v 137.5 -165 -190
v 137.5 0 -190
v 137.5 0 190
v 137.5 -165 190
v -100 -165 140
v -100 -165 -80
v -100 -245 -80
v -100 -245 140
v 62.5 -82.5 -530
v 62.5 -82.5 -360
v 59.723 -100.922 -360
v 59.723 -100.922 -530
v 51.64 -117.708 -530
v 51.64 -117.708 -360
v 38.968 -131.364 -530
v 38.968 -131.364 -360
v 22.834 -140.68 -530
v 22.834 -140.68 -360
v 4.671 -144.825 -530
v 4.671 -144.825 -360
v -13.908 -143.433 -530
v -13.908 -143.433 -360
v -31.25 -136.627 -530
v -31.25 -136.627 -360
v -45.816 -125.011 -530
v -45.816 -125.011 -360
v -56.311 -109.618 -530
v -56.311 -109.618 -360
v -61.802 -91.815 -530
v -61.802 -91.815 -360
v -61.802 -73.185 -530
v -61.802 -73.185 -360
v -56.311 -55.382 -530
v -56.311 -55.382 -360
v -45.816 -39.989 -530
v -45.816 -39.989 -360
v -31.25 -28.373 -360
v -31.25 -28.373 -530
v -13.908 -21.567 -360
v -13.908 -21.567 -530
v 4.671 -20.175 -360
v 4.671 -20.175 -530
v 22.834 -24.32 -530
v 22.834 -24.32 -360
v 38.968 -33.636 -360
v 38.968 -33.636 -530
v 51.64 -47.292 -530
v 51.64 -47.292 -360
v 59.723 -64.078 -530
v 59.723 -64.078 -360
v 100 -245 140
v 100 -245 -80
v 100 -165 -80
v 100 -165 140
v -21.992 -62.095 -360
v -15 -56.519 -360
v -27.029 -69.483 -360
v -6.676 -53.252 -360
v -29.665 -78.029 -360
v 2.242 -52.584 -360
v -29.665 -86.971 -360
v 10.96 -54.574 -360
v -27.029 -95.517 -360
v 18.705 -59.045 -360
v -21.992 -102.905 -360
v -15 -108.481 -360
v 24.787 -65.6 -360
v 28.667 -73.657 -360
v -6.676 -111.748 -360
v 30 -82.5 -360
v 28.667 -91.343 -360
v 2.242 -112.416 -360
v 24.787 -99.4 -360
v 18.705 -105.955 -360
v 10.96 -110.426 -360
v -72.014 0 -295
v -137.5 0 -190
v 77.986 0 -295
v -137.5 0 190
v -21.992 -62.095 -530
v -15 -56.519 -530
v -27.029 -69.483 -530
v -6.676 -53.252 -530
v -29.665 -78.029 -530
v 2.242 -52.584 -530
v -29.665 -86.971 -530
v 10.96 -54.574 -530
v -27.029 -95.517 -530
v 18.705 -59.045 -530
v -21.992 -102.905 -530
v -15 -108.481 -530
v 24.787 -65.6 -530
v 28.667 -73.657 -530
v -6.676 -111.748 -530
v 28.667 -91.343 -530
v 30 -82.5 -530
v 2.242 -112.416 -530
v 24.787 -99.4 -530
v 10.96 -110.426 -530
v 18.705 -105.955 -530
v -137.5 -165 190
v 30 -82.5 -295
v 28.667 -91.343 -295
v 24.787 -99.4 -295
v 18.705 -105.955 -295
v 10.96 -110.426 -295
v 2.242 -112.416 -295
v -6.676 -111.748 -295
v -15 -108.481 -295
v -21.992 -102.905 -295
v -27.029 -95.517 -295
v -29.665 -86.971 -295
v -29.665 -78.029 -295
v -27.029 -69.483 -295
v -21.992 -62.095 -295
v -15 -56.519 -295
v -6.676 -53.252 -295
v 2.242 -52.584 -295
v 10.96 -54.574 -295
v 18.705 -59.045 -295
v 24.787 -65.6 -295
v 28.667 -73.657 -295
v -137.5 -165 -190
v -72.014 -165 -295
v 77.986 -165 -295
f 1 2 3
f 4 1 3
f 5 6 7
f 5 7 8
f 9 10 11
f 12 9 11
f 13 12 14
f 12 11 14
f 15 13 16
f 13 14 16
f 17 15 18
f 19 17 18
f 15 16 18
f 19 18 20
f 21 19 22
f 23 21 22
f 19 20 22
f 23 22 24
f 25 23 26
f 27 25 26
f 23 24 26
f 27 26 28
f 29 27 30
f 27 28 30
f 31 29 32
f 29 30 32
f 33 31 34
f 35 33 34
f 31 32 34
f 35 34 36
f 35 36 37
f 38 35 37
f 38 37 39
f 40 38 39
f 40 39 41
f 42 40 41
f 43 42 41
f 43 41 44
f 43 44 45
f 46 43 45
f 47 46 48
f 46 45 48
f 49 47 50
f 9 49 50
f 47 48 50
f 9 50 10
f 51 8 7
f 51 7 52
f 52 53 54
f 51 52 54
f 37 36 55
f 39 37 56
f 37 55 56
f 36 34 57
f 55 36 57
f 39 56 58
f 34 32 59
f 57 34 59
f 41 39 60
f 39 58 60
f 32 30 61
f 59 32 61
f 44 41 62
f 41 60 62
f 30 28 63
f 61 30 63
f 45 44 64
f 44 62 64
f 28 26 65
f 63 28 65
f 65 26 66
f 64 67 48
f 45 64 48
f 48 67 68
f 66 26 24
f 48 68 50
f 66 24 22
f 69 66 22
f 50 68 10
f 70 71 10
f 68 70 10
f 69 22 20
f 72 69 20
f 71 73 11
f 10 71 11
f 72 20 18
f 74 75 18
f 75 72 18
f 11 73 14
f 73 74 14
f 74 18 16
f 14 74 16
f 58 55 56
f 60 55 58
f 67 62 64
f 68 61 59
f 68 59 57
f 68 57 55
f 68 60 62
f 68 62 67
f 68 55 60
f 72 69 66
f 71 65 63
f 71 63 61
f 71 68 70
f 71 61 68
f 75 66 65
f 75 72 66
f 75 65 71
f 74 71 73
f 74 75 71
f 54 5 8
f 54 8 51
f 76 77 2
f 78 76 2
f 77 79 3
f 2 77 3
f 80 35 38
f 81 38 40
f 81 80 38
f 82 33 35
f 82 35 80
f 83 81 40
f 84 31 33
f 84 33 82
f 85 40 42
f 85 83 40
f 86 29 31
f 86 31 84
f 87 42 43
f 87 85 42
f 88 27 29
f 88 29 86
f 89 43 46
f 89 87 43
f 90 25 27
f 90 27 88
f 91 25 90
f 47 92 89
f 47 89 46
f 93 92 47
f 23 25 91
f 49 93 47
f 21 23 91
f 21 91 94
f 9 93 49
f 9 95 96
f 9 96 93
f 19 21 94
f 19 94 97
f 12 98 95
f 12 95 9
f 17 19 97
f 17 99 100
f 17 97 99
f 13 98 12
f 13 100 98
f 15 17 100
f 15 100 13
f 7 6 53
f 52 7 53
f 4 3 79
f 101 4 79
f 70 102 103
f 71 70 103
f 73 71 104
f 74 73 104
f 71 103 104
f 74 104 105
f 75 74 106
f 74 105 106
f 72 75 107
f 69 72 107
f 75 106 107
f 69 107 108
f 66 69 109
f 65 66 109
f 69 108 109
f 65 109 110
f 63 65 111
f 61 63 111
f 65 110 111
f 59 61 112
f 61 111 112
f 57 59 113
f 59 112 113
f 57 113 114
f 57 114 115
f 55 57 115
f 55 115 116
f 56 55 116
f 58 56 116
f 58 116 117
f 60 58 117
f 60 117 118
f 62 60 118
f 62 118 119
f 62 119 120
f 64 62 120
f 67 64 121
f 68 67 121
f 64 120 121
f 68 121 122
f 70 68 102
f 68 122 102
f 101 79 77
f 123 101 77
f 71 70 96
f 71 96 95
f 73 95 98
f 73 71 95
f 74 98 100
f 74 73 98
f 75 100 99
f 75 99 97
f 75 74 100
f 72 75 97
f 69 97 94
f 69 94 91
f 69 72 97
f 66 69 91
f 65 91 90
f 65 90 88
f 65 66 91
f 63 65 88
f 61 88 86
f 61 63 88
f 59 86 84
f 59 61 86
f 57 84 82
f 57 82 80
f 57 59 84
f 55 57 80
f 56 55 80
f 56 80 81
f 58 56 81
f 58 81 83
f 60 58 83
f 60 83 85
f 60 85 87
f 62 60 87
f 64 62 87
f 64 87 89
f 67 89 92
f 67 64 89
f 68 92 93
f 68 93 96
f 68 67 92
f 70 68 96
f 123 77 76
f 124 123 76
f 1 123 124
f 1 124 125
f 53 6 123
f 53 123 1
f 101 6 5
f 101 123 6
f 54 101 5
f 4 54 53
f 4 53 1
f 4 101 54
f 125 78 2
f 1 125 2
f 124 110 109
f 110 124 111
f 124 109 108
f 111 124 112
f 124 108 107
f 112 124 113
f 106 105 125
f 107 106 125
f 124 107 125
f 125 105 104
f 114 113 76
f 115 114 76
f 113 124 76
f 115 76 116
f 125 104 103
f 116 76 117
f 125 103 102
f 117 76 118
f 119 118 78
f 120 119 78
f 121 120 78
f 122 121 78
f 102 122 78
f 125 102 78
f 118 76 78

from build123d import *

# Parameters (mm, degrees)
F1_DEPTH = 165
F7_R     = 30
F2_DEPTH = 65
F3_R     = 62.5
F3_R_2   = 30
F4_DEPTH = 170
F5_W     = 200
F5_H     = 220
F6_DEPTH = 80


with BuildPart() as f1:
    # F0 (on Front) → F1 (new body)
    with BuildSketch(Plane.XZ):
        Polygon((137.5, -190), (137.5, 190), (-137.5, 190), (-137.5, -190), (-72.013795, -295), (77.986205, -295), align=None)
    extrude(amount=F1_DEPTH)

    # F7 (on face) → F2 (join)
    with BuildSketch(Plane(origin=(0, 0, -295), x_dir=(1, 0, 0), z_dir=(0, 0, -1))):
        with Locations((0, 82.5)):
            Circle(F7_R)
    extrude(amount=F2_DEPTH)

    # F3 (on face) → F4 (join)
    with BuildSketch(Plane(origin=(0, 0, -360), x_dir=(1, 0, 0), z_dir=(0, 0, -1))):
        with Locations((0, 82.5)):
            Circle(F3_R)
        with Locations((0, 82.5)):
            Circle(F3_R_2, mode=Mode.SUBTRACT)
    extrude(amount=F4_DEPTH)

    # F5 (on face) → F6 (join)
    with BuildSketch(Plane.XZ.offset(165)):
        with Locations((0, 30)):
            Rectangle(F5_W, F5_H)
    extrude(amount=F6_DEPTH)


solid = f1.part
